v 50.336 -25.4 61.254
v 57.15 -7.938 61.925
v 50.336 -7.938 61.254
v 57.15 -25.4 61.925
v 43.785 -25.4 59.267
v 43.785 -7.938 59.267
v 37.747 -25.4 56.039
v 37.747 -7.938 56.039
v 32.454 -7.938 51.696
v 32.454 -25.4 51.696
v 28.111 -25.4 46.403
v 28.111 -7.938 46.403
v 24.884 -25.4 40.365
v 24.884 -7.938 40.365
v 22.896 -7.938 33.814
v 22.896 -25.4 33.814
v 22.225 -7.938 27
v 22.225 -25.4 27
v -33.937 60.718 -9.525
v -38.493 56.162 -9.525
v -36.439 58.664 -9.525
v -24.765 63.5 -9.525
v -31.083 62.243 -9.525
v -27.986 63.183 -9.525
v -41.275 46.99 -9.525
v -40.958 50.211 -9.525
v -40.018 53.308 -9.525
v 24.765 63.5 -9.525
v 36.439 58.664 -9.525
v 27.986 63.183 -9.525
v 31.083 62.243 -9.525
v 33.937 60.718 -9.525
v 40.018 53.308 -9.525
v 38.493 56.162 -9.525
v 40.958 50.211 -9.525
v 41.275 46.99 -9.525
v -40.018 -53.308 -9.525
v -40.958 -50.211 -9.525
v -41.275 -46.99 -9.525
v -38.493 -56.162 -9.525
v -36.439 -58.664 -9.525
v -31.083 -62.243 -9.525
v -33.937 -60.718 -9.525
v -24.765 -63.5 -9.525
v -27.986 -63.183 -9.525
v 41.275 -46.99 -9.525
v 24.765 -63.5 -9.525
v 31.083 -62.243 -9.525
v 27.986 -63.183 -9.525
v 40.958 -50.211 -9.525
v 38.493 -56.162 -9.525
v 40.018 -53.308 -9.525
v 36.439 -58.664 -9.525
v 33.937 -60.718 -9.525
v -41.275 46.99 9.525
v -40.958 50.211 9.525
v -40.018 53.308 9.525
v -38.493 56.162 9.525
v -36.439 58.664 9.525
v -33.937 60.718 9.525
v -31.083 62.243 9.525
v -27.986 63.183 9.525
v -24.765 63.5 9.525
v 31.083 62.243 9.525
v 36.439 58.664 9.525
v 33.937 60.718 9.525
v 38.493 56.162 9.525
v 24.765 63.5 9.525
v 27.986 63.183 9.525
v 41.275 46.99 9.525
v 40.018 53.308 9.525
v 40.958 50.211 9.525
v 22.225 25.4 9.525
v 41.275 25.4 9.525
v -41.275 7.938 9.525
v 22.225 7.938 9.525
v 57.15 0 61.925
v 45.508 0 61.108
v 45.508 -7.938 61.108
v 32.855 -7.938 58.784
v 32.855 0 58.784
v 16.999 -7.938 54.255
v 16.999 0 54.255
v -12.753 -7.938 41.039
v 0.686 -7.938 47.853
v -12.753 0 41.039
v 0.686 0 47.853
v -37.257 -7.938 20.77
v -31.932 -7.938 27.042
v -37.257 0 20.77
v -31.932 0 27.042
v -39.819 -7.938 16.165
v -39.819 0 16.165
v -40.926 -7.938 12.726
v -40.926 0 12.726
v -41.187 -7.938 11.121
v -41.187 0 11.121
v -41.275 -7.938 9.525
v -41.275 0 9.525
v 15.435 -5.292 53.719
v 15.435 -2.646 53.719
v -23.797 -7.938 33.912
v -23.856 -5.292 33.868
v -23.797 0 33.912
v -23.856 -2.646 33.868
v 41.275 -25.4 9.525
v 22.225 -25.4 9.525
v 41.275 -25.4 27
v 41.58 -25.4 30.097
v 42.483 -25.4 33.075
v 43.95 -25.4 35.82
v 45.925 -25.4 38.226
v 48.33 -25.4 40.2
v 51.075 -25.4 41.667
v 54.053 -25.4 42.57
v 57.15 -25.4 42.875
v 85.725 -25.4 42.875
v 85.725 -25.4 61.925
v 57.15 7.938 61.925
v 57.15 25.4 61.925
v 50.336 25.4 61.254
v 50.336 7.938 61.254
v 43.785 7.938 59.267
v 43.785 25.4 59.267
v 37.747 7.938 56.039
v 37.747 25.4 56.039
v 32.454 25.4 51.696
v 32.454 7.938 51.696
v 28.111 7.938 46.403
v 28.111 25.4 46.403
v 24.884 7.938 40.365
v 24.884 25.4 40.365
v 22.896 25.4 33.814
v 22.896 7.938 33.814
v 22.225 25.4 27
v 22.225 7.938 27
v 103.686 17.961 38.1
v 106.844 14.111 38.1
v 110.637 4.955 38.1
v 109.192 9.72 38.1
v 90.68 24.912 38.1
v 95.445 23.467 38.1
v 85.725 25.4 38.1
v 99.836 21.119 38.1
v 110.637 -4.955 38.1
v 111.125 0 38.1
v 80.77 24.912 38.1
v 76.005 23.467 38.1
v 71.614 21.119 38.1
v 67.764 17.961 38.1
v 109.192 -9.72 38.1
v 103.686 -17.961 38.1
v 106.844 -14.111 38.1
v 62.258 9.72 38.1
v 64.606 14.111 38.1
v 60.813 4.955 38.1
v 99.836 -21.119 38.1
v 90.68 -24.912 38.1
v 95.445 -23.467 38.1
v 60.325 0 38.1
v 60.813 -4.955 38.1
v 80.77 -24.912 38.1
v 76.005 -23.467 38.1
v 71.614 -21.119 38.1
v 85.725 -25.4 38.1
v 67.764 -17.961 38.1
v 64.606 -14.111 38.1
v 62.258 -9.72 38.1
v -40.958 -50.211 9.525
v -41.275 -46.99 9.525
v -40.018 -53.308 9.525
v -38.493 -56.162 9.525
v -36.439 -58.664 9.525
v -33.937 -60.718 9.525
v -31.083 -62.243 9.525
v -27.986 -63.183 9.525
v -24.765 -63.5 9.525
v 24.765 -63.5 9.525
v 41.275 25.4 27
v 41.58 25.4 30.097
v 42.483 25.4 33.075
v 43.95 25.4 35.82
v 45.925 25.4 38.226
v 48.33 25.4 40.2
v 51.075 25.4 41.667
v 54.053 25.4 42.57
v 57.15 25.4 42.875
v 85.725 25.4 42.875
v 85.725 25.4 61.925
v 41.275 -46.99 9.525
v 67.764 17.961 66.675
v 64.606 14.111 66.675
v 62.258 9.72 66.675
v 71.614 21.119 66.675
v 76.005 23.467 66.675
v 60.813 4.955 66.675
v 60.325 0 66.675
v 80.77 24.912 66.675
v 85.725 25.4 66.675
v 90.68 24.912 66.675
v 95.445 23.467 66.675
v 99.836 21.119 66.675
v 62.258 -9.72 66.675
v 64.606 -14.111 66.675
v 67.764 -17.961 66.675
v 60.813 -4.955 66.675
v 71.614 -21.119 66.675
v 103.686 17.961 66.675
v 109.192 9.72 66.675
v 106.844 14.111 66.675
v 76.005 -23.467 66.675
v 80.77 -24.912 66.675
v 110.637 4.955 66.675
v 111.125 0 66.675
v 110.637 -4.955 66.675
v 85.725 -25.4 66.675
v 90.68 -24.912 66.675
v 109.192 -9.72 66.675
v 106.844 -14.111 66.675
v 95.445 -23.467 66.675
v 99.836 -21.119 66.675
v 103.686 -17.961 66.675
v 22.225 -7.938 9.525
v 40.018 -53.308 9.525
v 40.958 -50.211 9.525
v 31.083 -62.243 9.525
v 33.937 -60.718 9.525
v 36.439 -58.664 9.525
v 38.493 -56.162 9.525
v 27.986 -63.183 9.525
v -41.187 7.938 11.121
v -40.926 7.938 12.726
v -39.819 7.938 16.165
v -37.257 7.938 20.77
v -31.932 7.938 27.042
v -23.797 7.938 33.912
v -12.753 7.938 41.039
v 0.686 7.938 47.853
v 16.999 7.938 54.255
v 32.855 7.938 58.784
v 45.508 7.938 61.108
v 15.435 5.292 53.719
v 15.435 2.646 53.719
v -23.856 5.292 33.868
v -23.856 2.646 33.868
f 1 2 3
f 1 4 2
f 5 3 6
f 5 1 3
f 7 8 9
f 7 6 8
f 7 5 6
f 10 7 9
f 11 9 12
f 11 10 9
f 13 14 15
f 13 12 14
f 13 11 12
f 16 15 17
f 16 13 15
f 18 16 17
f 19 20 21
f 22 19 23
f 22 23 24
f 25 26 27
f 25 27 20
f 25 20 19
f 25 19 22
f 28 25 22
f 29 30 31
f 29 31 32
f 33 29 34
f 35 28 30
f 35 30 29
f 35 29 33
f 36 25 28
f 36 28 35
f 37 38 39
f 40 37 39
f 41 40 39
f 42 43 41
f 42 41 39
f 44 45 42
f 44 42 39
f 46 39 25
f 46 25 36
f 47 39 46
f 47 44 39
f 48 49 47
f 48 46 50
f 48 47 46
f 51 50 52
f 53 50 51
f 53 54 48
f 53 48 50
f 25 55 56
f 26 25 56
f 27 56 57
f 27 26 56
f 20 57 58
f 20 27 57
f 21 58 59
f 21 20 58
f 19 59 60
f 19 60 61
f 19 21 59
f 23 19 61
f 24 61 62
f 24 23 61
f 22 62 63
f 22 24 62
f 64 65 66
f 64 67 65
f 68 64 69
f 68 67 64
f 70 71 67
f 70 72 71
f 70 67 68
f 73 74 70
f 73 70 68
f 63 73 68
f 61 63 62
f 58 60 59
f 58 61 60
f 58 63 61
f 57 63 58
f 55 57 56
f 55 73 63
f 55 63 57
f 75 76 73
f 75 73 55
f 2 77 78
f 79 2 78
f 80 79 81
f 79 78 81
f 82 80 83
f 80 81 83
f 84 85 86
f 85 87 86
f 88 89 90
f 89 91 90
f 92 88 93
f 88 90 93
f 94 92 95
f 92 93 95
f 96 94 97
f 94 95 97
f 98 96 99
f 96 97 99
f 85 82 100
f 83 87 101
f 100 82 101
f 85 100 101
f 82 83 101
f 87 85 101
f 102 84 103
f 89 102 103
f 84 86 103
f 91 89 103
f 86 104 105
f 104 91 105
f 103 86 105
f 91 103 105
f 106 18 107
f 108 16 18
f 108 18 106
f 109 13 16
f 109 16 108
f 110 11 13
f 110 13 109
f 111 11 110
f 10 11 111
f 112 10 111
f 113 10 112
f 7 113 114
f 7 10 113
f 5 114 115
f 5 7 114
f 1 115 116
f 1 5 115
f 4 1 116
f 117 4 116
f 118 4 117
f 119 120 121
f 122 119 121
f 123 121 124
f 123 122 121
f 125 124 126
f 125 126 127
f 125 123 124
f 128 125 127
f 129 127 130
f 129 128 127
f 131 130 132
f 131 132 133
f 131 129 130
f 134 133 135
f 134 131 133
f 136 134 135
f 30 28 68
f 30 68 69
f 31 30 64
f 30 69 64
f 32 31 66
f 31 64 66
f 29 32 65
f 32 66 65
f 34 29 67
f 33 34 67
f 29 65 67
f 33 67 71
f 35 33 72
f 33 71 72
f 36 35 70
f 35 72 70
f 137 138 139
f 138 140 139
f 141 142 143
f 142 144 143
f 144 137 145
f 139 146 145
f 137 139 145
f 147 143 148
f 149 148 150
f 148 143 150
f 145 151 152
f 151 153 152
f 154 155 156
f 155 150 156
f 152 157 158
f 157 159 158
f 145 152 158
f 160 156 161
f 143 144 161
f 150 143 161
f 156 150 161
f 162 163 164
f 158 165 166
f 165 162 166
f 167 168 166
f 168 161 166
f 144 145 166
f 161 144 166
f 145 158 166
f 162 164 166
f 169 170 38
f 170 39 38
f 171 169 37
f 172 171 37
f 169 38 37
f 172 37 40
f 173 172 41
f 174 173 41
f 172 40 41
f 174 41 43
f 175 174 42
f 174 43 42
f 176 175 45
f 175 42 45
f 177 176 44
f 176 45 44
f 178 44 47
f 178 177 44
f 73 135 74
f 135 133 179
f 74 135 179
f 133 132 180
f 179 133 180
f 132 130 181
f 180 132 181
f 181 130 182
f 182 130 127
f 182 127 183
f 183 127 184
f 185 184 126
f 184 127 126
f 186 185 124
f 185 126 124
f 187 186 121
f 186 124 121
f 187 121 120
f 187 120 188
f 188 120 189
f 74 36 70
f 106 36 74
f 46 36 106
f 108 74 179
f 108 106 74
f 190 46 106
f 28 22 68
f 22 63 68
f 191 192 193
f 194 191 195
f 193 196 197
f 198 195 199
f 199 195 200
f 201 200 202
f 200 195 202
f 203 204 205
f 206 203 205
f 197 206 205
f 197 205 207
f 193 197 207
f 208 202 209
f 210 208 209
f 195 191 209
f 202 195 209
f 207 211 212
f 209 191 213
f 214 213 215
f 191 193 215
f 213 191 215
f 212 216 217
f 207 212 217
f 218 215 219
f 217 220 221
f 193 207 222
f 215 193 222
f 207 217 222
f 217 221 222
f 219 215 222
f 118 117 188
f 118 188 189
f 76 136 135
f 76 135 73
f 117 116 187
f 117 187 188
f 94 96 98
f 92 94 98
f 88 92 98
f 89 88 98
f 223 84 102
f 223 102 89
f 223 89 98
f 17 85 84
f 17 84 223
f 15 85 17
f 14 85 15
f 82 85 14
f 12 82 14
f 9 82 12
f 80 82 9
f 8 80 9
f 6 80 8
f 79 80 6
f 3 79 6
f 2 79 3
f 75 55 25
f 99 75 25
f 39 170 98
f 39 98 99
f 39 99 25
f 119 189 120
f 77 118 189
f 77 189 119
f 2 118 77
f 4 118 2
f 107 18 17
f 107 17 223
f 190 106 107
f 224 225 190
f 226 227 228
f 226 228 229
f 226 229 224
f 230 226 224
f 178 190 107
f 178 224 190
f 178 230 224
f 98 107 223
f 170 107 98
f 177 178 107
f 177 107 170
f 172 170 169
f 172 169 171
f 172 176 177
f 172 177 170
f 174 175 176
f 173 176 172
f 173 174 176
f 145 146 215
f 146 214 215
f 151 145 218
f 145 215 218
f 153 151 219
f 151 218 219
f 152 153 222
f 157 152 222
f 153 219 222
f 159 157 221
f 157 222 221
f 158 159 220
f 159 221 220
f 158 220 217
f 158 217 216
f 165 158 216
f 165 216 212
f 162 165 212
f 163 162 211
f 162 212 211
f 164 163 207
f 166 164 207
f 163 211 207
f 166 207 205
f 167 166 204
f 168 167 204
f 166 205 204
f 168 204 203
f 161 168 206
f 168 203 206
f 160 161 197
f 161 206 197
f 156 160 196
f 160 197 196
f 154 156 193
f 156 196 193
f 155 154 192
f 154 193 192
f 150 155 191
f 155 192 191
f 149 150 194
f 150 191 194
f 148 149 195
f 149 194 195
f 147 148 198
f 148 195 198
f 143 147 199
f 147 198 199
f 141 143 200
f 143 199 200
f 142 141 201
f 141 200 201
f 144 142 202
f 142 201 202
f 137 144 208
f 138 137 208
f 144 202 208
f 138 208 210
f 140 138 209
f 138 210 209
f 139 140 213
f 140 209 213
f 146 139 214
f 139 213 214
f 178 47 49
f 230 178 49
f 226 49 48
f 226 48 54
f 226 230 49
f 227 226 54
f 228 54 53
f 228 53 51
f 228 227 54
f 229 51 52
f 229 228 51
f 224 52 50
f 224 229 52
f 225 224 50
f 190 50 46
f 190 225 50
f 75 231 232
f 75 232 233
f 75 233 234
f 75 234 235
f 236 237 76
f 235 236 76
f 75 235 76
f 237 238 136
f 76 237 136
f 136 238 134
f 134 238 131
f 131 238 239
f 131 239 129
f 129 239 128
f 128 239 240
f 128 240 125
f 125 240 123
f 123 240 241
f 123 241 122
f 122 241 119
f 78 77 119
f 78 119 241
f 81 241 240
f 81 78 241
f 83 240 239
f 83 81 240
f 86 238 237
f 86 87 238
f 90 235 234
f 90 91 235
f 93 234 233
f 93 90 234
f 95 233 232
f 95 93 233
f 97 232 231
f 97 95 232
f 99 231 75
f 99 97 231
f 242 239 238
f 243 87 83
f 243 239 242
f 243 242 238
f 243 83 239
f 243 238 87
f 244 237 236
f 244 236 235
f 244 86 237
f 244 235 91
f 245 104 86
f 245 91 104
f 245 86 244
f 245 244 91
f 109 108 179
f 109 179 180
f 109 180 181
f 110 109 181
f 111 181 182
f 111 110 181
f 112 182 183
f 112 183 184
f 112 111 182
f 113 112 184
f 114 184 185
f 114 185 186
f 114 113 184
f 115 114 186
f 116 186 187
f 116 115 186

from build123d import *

# Parameters (mm, degrees)
F1_DEPTH = 63.5
F0_W     = 25.4
F0_H     = 19.05
F2_DEPTH = 25.4
F3_DEPTH = 7.9375
F5_R     = 16.51


with BuildPart() as f1:
    # F0 (on Front) → F1 (new body, symmetric)
    with BuildSketch(Plane.XZ):
        Polygon((22.225, 9.525), (-41.275, 9.525), (-41.275, -9.525), (41.275, -9.525), (41.275, 9.525), align=None)
    extrude(amount=F1_DEPTH, both=True)

    # F0 (on Front) → F2 (join, symmetric)
    with BuildSketch(Plane.XZ):
        with BuildLine():
            Line((22.225, 27.0002), (22.225, 9.525))
            Line((22.225, 9.525), (41.275, 9.525))
            Line((41.275, 9.525), (41.275, 27.0002))
            ThreePointArc((41.275, 27.0002), (45.9246798487, 38.2255201513), (57.15, 42.8752))
            Line((57.15, 42.8752), (60.325, 42.8752))
            Line((60.325, 42.8752), (60.325, 61.9252))
            Line((60.325, 61.9252), (57.15, 61.9252))
            ThreePointArc((57.15, 61.9252), (32.4542956671, 51.6959043329), (22.225, 27.0002))
        make_face()
        with Locations((73.025, 52.4002)):
            Rectangle(F0_W, F0_H)
    extrude(amount=F2_DEPTH, both=True)

    # F0 (on Front) → F3 (join, symmetric)
    with BuildSketch(Plane.XZ):
        with BuildLine():
            add(Edge.make_bspline(
                [(57.15, 61.9252), (20.7065949253, 61.9252), (-41.275, 33.7306511851), (-41.275, 9.525)],
                knots=[0, 0, 0, 0, 111.5045361635, 111.5045361635, 111.5045361635, 111.5045361635], degree=3))
            Line((-41.275, 9.525), (22.225, 9.525))
            Line((22.225, 9.525), (22.225, 27.0002))
            ThreePointArc((22.225, 27.0002), (32.4542956671, 51.6959043329), (57.15, 61.9252))
        make_face()
    extrude(amount=F3_DEPTH, both=True)

    # F5
    f5_edges = [f1.edges().sort_by_distance(p)[0] for p in [
        (-41.275, -63.5, 0),
        (41.275, -63.5, 0),
        (41.275, 63.5, 0),
        (-41.275, 63.5, 0),
    ]]
    fillet(f5_edges, radius=F5_R)


with BuildPart() as f4:
    # F0 (on Front) → F4 (revolve)
    with BuildSketch(Plane.XZ):
        Polygon((85.725, 66.675), (85.725, 61.9252), (85.725, 42.8752), (85.725, 38.1), (111.125, 38.1), (111.125, 66.675), align=None)
    revolve(axis=Axis((85.725, 0, 52.3875), (0, 0, -1)))


solid = Compound([f1.part, f4.part])
